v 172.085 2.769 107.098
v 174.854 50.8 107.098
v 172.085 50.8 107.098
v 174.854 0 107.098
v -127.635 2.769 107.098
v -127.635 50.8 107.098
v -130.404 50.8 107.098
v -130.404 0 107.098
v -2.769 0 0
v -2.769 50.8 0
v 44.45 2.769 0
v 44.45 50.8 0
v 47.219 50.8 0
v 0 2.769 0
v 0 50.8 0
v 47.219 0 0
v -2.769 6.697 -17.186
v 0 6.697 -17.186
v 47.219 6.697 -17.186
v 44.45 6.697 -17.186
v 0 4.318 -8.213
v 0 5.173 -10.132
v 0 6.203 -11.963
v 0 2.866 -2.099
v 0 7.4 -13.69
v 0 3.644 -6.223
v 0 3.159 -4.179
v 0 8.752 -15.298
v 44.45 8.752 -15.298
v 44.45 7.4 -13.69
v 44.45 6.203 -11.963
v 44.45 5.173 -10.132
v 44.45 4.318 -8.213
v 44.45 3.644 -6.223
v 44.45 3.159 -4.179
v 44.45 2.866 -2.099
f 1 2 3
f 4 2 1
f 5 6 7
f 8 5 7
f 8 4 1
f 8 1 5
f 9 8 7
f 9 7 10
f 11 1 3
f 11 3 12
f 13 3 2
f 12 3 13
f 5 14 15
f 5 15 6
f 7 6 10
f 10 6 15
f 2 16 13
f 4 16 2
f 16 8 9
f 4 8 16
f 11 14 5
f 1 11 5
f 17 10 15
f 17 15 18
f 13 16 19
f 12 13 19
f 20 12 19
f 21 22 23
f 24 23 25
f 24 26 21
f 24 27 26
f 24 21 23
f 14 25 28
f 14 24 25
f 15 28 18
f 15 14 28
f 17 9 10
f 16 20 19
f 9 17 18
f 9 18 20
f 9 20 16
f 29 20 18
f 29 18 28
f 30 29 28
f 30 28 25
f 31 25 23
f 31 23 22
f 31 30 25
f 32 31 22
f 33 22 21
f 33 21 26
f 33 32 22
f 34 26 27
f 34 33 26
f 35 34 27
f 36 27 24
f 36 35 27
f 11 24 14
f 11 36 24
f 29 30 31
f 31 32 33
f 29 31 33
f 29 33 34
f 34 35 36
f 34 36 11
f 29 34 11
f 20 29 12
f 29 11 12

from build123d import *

# Parameters (mm, degrees)
BOSS_EXTRUDE1_DEPTH   = 2.7686
BOSS_EXTRUDE2_START   = -2.7686
BOSS_EXTRUDE2_DEPTH   = 50.8
BOSS_EXTRUDE2_2_DEPTH = 50.8
SKETCH4_W             = 2.7686
SKETCH4_H             = 50.8
BOSS_EXTRUDE3_DEPTH   = 25.4
CUT_EXTRUDE1_DEPTH    = 47.2186
BOSS_EXTRUDE6_DEPTH   = 44.45


with BuildPart() as part:
    # Sketch1 → Boss-Extrude1 (new body)
    with BuildSketch(Plane(origin=(0, 0, 0), x_dir=(1, 0, 0), z_dir=(0, 1, 0))):
        Polygon((0, 0), (44.45, 0), (172.085, -107.098481425), (-127.635, -107.098481425), align=None)
    extrude(amount=BOSS_EXTRUDE1_DEPTH)



with BuildPart() as body_2:
    # Sketch2 → Boss-Extrude2 (new body)
    with BuildSketch(Plane(origin=(0, 2.7686, 0), x_dir=(1, 0, 0), z_dir=(0, 1, 0)).offset(BOSS_EXTRUDE2_START)):
        Polygon((0, 0), (-127.635, -107.098481425), (-130.4036, -107.098481425), (-2.7686, 0), align=None)
    extrude(amount=BOSS_EXTRUDE2_DEPTH)


with BuildPart() as body_3:
    # Sketch2 → Boss-Extrude2 2 (new body)
    with BuildSketch(Plane(origin=(0, 2.7686, 0), x_dir=(1, 0, 0), z_dir=(0, 1, 0)).offset(BOSS_EXTRUDE2_START)):
        Polygon((44.45, 0), (47.2186, 0), (174.8536, -107.098481425), (172.085, -107.098481425), align=None)
    extrude(amount=BOSS_EXTRUDE2_2_DEPTH)


with BuildPart() as part_1:
    add(part.part)

    add(body_3.part)  # Boss-Extrude3 merges body 3
    # Sketch4 → Boss-Extrude3 (add)
    with BuildSketch(Plane(origin=(0, 0, 0), x_dir=(-1, 0, 0), z_dir=(0, 0, -1))):
        with Locations((-45.8343, 25.4)):
            Rectangle(SKETCH4_W, SKETCH4_H)
    boss_extrude3 = extrude(amount=BOSS_EXTRUDE3_DEPTH)

    # Sketch5 → Cut-Extrude1 (cut)
    with BuildSketch(Plane(origin=(47.2186, 0, 0), x_dir=(0, 0, -1), z_dir=(1, 0, 0))):
        Polygon((17.186035514, 6.697089394), (0, 0), (25.4, 0), (25.4, 14.244871038), (25.4, 50.8), (0, 50.8), align=None)
    cut_extrude1 = extrude(amount=-CUT_EXTRUDE1_DEPTH, mode=Mode.SUBTRACT)


    add(body_2.part)  # Boss-Extrude6 merges body 2
    # Sketch10 → Boss-Extrude6 (add)
    with BuildSketch(Plane.ZY.offset(-44.45)):
        with BuildLine():
            Line((-17.186035514, 6.697089394), (-15.298135688, 8.75161917))
            ThreePointArc((-15.298135688, 8.75161917), (-8.213243481, 4.317554379), (0, 2.7686))
            Line((0, 2.7686), (0, 0))
            Line((0, 0), (-17.186035514, 6.697089394))
        make_face()
    extrude(amount=BOSS_EXTRUDE6_DEPTH)

    # Mirror1: Boss-Extrude3 across plane
    add(boss_extrude3.mirror(Plane.ZY.offset(-22.225)))

    # Mirror2: Cut-Extrude1 across plane
    add(cut_extrude1.mirror(Plane.ZY.offset(-22.225)), mode=Mode.SUBTRACT)


solid = part_1.part
